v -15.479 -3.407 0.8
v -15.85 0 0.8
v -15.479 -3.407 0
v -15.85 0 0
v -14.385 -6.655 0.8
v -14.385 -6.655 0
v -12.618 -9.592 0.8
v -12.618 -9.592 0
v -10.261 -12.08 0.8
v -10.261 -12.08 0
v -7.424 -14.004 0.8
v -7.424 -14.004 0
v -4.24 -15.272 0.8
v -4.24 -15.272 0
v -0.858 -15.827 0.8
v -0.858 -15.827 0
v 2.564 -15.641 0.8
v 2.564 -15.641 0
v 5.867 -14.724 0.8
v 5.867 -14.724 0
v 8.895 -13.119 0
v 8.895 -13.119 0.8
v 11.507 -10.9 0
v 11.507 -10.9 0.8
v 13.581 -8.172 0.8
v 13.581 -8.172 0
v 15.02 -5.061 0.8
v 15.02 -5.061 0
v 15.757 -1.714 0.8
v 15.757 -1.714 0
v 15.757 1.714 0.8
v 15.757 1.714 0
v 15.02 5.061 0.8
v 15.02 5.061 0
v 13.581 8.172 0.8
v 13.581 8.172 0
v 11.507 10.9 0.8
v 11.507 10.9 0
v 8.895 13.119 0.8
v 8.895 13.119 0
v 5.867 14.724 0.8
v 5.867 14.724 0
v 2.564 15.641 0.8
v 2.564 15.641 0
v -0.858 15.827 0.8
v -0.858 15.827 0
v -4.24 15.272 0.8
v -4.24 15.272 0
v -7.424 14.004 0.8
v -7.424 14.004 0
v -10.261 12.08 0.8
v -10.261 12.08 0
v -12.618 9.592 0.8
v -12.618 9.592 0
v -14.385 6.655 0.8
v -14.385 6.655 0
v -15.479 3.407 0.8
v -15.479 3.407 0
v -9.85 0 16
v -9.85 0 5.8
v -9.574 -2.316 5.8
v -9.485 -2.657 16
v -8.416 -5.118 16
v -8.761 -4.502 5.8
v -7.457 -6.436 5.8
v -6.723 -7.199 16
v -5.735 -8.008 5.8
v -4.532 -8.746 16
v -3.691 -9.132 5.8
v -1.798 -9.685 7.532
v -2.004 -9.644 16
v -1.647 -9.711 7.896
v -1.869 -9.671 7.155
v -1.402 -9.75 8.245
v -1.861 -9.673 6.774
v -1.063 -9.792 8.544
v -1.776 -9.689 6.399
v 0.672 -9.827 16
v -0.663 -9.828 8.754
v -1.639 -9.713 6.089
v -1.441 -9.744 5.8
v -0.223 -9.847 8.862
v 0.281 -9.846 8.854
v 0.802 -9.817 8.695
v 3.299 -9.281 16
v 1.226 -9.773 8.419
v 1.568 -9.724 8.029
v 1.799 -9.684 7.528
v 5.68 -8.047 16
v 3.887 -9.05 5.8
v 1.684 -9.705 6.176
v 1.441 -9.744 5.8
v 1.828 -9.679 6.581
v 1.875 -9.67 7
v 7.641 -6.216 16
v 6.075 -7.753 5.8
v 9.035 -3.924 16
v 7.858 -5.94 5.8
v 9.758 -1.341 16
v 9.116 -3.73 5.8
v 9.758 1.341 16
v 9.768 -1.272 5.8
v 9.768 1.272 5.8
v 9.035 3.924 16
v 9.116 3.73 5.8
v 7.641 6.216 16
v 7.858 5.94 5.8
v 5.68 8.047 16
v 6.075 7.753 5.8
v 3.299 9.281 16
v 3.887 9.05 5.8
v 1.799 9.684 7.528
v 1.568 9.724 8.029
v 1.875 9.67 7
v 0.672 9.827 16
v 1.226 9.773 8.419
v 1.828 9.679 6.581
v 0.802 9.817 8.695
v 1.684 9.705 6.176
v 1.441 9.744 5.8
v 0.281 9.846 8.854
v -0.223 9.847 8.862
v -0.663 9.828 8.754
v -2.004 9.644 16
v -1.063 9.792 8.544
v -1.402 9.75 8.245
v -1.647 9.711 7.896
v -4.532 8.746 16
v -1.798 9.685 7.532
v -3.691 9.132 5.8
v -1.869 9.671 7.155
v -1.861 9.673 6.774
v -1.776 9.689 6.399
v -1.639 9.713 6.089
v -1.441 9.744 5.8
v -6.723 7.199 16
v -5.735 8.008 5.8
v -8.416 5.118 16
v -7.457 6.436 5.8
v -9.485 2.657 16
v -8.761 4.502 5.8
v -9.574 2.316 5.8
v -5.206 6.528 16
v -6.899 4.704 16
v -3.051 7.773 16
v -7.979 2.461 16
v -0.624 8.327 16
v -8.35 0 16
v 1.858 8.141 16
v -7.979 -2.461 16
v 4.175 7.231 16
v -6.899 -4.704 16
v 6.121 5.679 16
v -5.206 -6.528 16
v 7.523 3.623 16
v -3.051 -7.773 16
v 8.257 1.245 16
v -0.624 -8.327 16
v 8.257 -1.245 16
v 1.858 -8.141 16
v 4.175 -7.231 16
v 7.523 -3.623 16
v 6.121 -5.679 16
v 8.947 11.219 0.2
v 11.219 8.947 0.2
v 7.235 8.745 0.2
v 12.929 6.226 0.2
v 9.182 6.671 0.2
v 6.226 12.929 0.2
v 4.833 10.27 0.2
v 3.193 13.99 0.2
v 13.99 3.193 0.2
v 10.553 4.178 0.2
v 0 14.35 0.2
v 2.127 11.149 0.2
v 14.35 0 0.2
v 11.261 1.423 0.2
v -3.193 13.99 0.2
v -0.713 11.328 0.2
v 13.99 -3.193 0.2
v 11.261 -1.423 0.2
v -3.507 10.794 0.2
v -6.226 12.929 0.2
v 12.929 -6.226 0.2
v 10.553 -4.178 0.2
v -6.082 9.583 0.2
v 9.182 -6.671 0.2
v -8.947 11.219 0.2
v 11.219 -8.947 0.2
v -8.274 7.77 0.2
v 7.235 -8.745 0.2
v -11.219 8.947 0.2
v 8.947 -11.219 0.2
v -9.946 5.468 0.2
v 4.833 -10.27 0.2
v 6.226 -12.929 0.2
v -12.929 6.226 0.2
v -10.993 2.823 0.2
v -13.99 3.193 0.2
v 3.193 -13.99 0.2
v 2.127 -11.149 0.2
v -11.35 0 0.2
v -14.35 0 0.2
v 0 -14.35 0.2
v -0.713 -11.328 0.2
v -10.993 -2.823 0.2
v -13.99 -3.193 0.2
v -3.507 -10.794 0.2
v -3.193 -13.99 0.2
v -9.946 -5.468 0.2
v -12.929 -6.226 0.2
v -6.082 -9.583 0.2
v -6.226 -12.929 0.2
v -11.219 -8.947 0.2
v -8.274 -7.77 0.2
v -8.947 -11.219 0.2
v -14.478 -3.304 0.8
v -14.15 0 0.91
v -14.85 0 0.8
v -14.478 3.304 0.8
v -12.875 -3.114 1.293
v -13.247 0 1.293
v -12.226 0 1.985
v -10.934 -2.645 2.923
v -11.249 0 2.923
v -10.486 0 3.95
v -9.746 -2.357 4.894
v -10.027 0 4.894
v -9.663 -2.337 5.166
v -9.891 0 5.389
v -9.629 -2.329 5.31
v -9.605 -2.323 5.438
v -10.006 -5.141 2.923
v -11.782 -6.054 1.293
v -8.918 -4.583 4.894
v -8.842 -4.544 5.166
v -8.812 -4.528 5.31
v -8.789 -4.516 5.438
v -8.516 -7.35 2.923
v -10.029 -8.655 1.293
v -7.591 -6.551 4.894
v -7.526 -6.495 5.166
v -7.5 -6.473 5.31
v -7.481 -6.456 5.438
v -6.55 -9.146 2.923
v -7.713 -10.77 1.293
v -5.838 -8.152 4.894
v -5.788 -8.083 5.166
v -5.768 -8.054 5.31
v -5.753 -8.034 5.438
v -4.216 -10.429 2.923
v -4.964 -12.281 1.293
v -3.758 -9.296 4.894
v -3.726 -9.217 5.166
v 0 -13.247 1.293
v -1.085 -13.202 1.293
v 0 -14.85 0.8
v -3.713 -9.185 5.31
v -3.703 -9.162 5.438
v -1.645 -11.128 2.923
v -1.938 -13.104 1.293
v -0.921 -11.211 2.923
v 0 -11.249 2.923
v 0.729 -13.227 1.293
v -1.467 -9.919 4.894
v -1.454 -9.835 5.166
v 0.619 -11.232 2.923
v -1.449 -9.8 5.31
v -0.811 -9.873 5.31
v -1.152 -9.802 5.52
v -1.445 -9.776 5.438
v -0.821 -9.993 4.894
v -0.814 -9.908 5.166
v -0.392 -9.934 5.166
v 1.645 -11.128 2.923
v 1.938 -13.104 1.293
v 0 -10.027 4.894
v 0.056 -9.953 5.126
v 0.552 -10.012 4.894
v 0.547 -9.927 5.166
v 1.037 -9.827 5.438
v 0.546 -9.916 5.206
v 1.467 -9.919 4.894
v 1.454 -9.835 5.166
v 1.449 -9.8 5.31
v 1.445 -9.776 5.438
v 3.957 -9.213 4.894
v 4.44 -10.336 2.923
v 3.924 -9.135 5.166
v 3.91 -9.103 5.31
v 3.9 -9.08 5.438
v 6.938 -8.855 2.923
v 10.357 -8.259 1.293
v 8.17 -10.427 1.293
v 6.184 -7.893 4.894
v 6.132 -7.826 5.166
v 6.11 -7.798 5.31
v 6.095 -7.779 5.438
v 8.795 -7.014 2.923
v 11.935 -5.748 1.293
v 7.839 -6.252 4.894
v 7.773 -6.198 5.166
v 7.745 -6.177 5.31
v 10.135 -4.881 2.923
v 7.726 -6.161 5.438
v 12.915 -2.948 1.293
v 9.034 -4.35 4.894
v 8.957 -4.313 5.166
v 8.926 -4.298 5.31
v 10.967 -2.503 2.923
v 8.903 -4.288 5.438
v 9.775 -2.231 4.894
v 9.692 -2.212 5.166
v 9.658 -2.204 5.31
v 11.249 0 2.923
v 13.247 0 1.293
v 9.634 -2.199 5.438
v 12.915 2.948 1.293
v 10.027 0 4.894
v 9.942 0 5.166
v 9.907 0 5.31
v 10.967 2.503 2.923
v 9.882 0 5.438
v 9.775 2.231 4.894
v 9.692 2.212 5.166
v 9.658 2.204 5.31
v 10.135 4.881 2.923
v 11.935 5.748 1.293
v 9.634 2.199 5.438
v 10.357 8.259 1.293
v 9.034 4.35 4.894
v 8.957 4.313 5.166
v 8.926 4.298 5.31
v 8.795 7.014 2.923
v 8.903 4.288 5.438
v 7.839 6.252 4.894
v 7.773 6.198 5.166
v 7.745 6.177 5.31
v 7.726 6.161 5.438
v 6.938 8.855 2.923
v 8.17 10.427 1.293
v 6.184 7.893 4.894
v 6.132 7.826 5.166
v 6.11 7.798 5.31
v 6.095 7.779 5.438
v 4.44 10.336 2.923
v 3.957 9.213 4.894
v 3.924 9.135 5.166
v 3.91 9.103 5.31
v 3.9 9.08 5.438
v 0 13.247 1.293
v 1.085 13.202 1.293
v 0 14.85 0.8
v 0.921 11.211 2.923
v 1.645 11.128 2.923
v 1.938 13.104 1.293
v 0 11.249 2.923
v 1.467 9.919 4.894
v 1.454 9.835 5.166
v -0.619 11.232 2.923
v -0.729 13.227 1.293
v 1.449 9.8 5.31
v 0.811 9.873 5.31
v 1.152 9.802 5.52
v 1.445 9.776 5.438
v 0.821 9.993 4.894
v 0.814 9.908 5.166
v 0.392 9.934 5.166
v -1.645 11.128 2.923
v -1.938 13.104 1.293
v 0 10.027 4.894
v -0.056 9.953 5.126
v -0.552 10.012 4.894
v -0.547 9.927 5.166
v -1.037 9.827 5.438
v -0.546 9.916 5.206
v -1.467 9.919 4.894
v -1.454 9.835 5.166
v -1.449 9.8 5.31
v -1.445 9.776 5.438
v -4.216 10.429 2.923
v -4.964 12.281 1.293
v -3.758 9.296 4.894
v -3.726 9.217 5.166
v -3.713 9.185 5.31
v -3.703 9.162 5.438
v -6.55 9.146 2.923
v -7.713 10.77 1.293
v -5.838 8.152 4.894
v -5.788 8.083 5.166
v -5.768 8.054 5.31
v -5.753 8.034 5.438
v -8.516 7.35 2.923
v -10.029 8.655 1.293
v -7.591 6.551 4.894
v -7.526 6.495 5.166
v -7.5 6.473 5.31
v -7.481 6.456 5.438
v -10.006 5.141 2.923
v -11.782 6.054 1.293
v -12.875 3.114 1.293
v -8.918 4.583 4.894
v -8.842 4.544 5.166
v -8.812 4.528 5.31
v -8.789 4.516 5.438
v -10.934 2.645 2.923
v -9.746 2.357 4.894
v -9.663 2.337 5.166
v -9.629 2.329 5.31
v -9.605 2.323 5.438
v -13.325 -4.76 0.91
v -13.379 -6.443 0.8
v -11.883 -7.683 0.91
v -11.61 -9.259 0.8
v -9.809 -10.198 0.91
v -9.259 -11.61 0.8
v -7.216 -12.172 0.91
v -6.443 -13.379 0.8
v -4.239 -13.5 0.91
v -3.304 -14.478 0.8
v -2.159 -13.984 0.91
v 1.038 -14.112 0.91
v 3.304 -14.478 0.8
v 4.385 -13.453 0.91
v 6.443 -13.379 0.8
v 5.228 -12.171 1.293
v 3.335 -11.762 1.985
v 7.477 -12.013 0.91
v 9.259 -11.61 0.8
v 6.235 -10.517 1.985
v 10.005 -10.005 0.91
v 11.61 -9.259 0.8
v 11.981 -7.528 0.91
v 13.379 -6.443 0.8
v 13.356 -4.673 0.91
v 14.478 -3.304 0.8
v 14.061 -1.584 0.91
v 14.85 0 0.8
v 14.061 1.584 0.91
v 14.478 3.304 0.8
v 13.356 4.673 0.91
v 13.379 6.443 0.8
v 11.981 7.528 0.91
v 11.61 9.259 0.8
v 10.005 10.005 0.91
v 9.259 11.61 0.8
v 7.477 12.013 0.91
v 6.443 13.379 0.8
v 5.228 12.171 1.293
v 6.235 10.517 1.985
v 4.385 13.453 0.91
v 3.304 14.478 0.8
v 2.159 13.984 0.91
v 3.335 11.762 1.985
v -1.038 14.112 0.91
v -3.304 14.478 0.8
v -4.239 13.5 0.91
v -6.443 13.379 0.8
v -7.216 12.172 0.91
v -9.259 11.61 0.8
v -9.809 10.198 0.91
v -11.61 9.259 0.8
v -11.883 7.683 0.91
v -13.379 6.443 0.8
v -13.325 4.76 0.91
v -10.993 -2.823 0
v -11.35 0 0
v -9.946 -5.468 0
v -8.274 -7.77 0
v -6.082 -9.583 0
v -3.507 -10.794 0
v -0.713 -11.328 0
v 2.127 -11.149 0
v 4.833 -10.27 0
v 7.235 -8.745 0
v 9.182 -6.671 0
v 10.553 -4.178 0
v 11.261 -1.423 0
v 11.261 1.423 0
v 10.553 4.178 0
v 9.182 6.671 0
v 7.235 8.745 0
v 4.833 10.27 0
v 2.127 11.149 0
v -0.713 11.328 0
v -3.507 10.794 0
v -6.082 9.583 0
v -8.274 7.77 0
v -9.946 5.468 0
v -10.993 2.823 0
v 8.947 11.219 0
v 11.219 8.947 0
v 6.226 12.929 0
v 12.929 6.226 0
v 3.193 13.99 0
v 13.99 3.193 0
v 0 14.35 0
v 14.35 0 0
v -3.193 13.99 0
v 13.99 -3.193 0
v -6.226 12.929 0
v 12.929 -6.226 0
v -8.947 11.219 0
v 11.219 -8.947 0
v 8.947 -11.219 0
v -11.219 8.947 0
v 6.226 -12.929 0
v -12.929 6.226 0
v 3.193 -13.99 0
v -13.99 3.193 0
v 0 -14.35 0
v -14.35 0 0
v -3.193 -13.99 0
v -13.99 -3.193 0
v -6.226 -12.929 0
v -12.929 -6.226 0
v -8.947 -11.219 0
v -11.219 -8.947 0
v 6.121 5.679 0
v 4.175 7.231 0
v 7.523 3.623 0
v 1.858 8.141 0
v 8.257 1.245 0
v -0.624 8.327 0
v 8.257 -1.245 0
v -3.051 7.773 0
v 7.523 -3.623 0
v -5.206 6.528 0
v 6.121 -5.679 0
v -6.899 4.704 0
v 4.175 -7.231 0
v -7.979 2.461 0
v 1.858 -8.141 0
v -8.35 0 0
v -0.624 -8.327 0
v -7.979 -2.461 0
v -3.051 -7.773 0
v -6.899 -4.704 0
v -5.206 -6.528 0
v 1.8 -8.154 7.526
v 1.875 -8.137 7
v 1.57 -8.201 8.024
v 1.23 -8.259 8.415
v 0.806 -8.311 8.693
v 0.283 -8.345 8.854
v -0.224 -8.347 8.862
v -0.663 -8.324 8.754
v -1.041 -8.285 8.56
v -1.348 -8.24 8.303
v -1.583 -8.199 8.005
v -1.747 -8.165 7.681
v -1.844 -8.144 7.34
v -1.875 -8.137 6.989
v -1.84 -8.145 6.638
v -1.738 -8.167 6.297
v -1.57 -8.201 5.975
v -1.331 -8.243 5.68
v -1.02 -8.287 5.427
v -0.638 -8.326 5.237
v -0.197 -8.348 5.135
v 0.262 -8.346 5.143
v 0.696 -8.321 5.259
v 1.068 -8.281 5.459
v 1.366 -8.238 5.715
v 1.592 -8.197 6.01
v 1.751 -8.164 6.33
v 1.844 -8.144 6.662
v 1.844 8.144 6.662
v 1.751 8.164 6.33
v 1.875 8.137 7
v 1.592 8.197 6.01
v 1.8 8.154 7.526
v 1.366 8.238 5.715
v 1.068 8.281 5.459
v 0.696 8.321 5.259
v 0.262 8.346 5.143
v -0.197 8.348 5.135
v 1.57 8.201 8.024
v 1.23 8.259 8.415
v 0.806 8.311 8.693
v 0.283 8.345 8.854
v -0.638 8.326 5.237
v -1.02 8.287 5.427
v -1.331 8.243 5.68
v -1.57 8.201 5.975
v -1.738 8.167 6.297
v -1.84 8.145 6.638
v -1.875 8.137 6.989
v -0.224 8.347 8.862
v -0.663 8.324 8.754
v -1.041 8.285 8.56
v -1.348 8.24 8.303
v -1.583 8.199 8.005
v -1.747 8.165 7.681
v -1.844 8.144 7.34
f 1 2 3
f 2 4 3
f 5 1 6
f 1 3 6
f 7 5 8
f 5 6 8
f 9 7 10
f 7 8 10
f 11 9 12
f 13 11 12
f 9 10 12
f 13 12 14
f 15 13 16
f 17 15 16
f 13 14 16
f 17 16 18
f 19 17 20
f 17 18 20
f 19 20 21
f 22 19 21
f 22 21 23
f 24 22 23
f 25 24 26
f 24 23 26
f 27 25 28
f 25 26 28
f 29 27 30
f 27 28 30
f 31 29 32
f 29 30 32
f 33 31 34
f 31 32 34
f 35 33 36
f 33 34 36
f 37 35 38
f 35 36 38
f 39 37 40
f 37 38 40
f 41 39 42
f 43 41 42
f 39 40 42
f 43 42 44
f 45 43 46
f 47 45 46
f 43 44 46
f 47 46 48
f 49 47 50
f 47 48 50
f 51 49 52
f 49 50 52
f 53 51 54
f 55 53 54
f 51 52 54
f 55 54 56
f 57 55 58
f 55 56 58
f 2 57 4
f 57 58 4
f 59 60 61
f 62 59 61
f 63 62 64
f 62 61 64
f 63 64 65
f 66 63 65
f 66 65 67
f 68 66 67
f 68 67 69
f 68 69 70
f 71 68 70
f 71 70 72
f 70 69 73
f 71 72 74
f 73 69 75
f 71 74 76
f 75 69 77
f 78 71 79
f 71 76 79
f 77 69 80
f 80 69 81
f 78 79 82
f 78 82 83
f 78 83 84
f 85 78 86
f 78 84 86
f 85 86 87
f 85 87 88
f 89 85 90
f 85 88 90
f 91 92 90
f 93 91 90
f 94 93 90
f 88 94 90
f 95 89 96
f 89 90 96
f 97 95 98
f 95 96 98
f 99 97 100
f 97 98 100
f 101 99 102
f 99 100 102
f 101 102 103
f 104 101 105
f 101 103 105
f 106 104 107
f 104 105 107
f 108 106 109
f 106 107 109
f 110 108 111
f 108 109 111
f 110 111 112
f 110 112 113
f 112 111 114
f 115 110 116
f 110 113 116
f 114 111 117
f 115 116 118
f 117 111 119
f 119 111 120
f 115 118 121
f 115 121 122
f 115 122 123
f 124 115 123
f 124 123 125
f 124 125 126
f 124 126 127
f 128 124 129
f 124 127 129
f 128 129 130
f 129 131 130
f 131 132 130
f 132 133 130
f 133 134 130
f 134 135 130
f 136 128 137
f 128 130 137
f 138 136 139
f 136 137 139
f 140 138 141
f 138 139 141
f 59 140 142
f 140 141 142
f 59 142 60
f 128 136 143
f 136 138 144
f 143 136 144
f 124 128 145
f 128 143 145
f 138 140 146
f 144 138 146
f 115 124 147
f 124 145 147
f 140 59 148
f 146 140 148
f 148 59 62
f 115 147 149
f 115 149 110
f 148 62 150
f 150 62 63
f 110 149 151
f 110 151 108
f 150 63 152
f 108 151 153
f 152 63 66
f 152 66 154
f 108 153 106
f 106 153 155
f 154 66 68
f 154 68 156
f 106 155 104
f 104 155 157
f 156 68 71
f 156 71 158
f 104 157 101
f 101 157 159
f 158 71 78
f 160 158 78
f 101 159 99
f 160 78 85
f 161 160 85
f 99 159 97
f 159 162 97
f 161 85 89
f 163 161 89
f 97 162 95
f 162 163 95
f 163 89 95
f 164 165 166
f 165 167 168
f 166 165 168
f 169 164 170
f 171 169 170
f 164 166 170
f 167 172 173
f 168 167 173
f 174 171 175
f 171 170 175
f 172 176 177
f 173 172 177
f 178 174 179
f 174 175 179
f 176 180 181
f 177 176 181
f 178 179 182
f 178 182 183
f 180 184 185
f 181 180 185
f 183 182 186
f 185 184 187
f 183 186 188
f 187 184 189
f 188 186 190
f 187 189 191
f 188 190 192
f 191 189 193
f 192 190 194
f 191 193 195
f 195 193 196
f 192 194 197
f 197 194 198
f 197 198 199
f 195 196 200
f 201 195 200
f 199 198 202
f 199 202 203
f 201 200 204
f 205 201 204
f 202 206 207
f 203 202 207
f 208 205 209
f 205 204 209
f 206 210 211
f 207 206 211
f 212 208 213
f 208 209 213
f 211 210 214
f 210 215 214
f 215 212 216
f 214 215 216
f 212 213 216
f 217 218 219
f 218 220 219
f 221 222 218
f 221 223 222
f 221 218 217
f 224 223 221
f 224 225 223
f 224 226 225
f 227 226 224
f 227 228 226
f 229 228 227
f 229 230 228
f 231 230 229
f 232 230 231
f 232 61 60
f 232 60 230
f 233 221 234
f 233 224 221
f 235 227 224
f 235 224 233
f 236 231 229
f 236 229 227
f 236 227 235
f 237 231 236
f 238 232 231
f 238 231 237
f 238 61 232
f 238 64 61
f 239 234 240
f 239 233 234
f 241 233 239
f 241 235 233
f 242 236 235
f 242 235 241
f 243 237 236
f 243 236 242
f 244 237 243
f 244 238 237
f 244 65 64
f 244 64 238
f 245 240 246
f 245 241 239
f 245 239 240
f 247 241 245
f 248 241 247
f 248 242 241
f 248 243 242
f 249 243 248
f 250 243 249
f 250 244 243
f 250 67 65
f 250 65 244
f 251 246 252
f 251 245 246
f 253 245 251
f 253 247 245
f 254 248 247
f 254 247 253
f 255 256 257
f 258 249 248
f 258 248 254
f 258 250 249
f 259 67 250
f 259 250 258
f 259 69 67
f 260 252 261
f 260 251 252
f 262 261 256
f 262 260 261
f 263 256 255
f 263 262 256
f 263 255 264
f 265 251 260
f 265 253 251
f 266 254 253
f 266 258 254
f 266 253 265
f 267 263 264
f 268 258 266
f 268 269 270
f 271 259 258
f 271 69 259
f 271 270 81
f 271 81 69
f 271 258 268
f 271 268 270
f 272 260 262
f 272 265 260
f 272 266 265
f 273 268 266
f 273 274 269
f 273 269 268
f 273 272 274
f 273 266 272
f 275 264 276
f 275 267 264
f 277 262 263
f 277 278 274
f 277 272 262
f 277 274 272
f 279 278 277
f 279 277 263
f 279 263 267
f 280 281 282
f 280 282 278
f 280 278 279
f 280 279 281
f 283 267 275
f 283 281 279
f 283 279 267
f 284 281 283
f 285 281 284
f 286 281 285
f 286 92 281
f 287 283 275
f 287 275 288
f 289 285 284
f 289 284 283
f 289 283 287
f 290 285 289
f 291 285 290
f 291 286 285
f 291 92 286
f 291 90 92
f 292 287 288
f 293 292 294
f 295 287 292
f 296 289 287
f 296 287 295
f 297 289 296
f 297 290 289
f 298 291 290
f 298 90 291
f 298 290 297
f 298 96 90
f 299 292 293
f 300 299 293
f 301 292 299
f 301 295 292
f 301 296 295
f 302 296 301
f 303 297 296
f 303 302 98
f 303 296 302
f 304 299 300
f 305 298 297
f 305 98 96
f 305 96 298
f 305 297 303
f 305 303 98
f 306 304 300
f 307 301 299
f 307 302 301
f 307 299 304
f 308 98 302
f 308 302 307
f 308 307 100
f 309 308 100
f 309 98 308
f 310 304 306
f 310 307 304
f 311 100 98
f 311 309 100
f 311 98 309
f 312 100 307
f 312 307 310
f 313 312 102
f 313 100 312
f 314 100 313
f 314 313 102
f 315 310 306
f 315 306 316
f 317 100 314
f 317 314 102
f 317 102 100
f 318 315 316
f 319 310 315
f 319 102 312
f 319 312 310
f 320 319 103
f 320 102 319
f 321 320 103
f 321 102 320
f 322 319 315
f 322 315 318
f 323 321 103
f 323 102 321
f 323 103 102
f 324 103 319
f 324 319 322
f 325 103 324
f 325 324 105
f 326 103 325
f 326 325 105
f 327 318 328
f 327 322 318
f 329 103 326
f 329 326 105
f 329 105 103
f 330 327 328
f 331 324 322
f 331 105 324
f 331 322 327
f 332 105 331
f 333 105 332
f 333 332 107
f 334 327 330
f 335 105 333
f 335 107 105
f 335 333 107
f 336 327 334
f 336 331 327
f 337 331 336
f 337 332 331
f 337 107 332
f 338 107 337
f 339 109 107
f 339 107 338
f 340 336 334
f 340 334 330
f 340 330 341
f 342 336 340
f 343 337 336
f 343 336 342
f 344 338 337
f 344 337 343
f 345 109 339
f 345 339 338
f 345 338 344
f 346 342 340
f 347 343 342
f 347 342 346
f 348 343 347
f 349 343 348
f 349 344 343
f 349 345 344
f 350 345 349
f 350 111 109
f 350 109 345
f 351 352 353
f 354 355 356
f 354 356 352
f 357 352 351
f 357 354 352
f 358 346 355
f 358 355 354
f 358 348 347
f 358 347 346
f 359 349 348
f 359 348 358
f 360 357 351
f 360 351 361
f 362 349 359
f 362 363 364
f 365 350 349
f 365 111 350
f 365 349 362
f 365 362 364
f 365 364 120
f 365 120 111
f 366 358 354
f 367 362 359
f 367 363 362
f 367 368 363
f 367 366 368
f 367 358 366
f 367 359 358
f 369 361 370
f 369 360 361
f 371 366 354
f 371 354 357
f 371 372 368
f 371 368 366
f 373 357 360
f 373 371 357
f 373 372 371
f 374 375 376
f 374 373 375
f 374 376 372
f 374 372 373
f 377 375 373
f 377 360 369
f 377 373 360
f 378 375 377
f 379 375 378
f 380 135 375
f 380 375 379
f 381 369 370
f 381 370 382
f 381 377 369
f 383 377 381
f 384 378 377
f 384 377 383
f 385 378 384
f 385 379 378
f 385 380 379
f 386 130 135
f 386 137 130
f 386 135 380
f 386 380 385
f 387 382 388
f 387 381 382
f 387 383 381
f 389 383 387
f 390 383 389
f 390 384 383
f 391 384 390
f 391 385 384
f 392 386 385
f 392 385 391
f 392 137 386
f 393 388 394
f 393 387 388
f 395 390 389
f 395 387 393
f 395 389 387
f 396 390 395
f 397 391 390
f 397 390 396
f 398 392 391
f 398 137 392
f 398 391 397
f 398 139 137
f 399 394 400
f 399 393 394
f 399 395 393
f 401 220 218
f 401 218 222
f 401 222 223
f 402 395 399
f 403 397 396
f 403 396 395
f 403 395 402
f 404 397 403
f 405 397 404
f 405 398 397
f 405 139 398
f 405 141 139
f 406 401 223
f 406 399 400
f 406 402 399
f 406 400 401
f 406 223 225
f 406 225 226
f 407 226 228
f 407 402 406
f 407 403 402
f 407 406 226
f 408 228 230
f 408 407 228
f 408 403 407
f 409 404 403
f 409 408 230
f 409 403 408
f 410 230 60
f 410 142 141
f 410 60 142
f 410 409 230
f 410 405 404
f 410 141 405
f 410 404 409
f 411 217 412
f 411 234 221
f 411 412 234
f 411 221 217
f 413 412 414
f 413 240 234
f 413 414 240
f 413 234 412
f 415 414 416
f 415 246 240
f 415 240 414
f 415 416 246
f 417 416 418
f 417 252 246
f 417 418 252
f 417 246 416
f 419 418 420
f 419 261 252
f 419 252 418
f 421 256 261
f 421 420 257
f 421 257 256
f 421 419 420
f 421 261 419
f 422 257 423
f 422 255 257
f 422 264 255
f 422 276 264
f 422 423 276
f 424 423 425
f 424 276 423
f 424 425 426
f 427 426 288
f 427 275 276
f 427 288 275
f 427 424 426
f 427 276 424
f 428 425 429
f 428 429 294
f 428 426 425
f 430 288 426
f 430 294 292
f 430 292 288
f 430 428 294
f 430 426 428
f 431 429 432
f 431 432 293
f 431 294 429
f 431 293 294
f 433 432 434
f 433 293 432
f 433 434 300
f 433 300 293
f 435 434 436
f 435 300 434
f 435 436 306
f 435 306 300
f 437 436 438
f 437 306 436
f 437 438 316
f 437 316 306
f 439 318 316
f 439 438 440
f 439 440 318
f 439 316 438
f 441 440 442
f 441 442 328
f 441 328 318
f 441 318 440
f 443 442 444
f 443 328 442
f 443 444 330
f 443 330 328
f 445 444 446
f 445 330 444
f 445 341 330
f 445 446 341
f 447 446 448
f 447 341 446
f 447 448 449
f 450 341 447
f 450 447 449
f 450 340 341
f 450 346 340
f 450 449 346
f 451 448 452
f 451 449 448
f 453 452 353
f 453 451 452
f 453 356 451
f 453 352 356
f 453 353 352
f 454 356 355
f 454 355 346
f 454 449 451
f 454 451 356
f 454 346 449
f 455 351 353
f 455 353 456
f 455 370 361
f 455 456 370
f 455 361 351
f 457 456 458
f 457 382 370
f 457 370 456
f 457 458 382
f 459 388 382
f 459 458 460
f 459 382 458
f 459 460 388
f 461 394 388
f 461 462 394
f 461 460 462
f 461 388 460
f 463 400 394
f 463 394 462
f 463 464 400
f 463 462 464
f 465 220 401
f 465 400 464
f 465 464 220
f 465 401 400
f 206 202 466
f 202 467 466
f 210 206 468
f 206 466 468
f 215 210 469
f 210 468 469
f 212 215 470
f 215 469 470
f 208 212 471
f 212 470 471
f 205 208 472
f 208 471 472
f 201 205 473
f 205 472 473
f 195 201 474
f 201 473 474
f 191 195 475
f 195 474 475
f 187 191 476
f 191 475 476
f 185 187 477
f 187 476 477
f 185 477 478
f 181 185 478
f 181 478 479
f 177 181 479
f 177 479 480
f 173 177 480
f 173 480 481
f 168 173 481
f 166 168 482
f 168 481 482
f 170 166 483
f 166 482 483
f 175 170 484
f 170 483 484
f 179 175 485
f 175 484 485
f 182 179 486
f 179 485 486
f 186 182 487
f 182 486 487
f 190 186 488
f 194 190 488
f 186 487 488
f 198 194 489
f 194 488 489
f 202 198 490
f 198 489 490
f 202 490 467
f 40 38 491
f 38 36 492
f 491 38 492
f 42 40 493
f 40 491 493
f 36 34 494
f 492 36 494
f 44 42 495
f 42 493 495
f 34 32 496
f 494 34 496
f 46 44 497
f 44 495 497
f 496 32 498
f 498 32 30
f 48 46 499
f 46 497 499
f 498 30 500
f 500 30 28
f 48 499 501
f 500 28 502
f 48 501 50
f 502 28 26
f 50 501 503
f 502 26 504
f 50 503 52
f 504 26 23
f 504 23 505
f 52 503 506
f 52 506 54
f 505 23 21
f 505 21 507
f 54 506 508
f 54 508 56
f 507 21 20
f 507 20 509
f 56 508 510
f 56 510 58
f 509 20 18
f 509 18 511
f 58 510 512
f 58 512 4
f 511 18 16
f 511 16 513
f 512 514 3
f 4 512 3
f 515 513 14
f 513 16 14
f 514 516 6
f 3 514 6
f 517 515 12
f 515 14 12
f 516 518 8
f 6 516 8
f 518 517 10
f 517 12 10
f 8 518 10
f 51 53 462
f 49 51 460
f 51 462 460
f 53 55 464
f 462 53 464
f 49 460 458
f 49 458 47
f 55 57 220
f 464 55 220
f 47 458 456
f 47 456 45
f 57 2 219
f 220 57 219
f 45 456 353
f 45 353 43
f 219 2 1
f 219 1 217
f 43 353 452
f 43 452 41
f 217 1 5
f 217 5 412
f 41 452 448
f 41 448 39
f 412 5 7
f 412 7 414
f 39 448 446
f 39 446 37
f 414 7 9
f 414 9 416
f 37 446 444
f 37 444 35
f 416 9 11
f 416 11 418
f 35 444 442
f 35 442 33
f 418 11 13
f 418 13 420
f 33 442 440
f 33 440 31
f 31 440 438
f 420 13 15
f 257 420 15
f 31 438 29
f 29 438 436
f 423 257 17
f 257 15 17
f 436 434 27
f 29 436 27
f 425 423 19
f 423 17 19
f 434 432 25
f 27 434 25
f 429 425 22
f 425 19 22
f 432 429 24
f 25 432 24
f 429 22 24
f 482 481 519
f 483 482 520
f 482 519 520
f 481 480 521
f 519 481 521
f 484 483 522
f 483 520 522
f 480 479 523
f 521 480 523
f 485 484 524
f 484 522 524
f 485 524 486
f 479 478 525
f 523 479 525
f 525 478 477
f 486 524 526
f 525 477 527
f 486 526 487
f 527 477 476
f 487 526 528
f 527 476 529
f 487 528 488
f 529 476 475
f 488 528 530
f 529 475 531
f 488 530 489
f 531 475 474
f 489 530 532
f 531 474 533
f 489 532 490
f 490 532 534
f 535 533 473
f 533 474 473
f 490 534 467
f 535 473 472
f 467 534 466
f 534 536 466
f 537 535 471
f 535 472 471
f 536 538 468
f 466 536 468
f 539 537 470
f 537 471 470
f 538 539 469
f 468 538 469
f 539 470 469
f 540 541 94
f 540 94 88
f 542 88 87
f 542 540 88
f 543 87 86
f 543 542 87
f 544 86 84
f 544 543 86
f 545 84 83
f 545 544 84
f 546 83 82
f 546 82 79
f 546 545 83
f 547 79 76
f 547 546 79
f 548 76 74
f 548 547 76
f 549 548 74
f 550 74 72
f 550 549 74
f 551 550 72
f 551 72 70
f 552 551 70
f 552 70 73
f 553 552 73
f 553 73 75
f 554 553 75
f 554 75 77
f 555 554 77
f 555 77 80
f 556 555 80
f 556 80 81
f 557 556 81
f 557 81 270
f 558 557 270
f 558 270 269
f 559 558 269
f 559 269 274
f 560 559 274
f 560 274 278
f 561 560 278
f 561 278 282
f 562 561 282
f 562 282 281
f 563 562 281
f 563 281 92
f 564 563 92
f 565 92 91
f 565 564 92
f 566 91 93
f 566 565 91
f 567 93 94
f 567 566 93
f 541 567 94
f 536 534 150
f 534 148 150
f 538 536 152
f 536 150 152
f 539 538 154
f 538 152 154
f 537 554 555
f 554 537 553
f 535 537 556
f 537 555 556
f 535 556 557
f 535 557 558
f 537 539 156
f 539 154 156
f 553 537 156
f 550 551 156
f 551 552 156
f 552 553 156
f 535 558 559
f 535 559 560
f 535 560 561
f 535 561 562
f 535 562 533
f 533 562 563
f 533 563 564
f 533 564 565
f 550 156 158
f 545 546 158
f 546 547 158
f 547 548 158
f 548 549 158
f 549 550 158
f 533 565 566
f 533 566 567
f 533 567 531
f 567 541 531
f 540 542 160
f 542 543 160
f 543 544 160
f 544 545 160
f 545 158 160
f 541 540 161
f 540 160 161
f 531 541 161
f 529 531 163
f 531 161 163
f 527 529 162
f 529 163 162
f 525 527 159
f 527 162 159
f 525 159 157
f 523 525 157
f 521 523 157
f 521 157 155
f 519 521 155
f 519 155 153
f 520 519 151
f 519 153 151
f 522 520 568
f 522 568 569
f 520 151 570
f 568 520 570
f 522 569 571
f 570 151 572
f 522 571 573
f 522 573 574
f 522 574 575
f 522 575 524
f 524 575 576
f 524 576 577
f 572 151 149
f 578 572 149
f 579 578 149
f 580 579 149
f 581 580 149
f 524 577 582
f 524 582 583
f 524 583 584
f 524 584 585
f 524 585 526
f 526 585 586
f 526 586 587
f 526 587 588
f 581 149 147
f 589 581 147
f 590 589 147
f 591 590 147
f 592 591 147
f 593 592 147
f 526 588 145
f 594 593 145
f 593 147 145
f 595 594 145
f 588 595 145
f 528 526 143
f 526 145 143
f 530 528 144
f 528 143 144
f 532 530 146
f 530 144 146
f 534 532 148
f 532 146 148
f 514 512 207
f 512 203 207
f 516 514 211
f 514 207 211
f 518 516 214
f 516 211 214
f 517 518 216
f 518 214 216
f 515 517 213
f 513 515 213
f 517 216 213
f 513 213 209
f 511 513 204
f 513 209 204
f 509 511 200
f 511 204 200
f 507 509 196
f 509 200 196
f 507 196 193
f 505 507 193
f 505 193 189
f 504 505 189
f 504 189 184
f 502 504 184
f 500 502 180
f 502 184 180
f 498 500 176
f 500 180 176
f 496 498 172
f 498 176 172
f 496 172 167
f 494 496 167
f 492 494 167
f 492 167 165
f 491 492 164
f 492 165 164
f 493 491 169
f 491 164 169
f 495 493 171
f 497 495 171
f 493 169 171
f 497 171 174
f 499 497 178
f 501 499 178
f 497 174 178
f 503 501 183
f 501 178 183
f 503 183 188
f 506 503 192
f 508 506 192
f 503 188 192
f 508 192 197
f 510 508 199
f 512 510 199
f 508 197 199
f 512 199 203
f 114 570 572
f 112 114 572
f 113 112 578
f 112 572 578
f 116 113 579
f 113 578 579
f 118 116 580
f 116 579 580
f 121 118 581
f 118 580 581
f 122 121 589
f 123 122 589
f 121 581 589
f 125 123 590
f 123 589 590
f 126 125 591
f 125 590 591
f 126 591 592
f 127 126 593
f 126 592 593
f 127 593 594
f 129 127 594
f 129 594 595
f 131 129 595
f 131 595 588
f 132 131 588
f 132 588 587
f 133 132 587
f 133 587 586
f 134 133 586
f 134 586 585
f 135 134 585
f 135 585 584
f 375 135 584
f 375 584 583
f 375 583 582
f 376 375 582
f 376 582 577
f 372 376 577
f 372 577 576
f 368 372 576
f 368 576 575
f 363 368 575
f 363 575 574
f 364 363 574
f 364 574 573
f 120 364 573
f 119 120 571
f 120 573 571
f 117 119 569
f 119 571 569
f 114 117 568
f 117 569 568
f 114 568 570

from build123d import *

# Parameters (mm, degrees)
F0_R          = 1.875
F3_DEPTH      = 15.851
F3_DEPTH_BACK = 15.851


# Not quite as in the source:
# - a fillet or chamfer that OpenCascade refuses, or shapes differently, is made with other operations: its cross-section is extruded or revolved along the edge and cut away or added


with BuildPart() as f1:
    # F0 (on Front) → F1 (revolve)
    with BuildSketch(Plane.XZ):
        Polygon((-15.85, 0.8), (-15.85, 0), (-14.35, 0), (-14.35, 0.2), (-11.35, 0.2), (-11.35, 0), (-8.35, 0), (-8.35, 16), (-9.85, 16), (-9.85, 0.8), align=None)
    revolve(axis=Axis((0, 0, 8), (0, 0, 1)))

    # F2: fillet of radius 5 on 1 edges, made by hand

    # F2_s1 → F2_t2 (revolve)
    with BuildSketch(Plane.XZ):
        with BuildLine():
            add(Edge.make_bspline(
                [(-14.85, 0.8), (-9.85, 0.8), (-9.85, 5.8)],
                knots=[0, 0, 0, 1, 1, 1], degree=2, weights=[1, 0.4285714286, 1]))
            Line((-9.85, 5.8), (-9.85, 0.8))
            Line((-9.85, 0.8), (-14.85, 0.8))
        make_face()
    revolve(axis=Axis((0, 0, 0.8), (0, 0, 1)))

    # F0 (on Front) → F3 (cut, two sides)
    with BuildSketch(Plane.XZ) as f3_sk:
        with Locations((0, 7)):
            Circle(F0_R)
    extrude(amount=-F3_DEPTH, mode=Mode.SUBTRACT)
    extrude(f3_sk.sketch, amount=F3_DEPTH_BACK, mode=Mode.SUBTRACT)


solid = f1.part
